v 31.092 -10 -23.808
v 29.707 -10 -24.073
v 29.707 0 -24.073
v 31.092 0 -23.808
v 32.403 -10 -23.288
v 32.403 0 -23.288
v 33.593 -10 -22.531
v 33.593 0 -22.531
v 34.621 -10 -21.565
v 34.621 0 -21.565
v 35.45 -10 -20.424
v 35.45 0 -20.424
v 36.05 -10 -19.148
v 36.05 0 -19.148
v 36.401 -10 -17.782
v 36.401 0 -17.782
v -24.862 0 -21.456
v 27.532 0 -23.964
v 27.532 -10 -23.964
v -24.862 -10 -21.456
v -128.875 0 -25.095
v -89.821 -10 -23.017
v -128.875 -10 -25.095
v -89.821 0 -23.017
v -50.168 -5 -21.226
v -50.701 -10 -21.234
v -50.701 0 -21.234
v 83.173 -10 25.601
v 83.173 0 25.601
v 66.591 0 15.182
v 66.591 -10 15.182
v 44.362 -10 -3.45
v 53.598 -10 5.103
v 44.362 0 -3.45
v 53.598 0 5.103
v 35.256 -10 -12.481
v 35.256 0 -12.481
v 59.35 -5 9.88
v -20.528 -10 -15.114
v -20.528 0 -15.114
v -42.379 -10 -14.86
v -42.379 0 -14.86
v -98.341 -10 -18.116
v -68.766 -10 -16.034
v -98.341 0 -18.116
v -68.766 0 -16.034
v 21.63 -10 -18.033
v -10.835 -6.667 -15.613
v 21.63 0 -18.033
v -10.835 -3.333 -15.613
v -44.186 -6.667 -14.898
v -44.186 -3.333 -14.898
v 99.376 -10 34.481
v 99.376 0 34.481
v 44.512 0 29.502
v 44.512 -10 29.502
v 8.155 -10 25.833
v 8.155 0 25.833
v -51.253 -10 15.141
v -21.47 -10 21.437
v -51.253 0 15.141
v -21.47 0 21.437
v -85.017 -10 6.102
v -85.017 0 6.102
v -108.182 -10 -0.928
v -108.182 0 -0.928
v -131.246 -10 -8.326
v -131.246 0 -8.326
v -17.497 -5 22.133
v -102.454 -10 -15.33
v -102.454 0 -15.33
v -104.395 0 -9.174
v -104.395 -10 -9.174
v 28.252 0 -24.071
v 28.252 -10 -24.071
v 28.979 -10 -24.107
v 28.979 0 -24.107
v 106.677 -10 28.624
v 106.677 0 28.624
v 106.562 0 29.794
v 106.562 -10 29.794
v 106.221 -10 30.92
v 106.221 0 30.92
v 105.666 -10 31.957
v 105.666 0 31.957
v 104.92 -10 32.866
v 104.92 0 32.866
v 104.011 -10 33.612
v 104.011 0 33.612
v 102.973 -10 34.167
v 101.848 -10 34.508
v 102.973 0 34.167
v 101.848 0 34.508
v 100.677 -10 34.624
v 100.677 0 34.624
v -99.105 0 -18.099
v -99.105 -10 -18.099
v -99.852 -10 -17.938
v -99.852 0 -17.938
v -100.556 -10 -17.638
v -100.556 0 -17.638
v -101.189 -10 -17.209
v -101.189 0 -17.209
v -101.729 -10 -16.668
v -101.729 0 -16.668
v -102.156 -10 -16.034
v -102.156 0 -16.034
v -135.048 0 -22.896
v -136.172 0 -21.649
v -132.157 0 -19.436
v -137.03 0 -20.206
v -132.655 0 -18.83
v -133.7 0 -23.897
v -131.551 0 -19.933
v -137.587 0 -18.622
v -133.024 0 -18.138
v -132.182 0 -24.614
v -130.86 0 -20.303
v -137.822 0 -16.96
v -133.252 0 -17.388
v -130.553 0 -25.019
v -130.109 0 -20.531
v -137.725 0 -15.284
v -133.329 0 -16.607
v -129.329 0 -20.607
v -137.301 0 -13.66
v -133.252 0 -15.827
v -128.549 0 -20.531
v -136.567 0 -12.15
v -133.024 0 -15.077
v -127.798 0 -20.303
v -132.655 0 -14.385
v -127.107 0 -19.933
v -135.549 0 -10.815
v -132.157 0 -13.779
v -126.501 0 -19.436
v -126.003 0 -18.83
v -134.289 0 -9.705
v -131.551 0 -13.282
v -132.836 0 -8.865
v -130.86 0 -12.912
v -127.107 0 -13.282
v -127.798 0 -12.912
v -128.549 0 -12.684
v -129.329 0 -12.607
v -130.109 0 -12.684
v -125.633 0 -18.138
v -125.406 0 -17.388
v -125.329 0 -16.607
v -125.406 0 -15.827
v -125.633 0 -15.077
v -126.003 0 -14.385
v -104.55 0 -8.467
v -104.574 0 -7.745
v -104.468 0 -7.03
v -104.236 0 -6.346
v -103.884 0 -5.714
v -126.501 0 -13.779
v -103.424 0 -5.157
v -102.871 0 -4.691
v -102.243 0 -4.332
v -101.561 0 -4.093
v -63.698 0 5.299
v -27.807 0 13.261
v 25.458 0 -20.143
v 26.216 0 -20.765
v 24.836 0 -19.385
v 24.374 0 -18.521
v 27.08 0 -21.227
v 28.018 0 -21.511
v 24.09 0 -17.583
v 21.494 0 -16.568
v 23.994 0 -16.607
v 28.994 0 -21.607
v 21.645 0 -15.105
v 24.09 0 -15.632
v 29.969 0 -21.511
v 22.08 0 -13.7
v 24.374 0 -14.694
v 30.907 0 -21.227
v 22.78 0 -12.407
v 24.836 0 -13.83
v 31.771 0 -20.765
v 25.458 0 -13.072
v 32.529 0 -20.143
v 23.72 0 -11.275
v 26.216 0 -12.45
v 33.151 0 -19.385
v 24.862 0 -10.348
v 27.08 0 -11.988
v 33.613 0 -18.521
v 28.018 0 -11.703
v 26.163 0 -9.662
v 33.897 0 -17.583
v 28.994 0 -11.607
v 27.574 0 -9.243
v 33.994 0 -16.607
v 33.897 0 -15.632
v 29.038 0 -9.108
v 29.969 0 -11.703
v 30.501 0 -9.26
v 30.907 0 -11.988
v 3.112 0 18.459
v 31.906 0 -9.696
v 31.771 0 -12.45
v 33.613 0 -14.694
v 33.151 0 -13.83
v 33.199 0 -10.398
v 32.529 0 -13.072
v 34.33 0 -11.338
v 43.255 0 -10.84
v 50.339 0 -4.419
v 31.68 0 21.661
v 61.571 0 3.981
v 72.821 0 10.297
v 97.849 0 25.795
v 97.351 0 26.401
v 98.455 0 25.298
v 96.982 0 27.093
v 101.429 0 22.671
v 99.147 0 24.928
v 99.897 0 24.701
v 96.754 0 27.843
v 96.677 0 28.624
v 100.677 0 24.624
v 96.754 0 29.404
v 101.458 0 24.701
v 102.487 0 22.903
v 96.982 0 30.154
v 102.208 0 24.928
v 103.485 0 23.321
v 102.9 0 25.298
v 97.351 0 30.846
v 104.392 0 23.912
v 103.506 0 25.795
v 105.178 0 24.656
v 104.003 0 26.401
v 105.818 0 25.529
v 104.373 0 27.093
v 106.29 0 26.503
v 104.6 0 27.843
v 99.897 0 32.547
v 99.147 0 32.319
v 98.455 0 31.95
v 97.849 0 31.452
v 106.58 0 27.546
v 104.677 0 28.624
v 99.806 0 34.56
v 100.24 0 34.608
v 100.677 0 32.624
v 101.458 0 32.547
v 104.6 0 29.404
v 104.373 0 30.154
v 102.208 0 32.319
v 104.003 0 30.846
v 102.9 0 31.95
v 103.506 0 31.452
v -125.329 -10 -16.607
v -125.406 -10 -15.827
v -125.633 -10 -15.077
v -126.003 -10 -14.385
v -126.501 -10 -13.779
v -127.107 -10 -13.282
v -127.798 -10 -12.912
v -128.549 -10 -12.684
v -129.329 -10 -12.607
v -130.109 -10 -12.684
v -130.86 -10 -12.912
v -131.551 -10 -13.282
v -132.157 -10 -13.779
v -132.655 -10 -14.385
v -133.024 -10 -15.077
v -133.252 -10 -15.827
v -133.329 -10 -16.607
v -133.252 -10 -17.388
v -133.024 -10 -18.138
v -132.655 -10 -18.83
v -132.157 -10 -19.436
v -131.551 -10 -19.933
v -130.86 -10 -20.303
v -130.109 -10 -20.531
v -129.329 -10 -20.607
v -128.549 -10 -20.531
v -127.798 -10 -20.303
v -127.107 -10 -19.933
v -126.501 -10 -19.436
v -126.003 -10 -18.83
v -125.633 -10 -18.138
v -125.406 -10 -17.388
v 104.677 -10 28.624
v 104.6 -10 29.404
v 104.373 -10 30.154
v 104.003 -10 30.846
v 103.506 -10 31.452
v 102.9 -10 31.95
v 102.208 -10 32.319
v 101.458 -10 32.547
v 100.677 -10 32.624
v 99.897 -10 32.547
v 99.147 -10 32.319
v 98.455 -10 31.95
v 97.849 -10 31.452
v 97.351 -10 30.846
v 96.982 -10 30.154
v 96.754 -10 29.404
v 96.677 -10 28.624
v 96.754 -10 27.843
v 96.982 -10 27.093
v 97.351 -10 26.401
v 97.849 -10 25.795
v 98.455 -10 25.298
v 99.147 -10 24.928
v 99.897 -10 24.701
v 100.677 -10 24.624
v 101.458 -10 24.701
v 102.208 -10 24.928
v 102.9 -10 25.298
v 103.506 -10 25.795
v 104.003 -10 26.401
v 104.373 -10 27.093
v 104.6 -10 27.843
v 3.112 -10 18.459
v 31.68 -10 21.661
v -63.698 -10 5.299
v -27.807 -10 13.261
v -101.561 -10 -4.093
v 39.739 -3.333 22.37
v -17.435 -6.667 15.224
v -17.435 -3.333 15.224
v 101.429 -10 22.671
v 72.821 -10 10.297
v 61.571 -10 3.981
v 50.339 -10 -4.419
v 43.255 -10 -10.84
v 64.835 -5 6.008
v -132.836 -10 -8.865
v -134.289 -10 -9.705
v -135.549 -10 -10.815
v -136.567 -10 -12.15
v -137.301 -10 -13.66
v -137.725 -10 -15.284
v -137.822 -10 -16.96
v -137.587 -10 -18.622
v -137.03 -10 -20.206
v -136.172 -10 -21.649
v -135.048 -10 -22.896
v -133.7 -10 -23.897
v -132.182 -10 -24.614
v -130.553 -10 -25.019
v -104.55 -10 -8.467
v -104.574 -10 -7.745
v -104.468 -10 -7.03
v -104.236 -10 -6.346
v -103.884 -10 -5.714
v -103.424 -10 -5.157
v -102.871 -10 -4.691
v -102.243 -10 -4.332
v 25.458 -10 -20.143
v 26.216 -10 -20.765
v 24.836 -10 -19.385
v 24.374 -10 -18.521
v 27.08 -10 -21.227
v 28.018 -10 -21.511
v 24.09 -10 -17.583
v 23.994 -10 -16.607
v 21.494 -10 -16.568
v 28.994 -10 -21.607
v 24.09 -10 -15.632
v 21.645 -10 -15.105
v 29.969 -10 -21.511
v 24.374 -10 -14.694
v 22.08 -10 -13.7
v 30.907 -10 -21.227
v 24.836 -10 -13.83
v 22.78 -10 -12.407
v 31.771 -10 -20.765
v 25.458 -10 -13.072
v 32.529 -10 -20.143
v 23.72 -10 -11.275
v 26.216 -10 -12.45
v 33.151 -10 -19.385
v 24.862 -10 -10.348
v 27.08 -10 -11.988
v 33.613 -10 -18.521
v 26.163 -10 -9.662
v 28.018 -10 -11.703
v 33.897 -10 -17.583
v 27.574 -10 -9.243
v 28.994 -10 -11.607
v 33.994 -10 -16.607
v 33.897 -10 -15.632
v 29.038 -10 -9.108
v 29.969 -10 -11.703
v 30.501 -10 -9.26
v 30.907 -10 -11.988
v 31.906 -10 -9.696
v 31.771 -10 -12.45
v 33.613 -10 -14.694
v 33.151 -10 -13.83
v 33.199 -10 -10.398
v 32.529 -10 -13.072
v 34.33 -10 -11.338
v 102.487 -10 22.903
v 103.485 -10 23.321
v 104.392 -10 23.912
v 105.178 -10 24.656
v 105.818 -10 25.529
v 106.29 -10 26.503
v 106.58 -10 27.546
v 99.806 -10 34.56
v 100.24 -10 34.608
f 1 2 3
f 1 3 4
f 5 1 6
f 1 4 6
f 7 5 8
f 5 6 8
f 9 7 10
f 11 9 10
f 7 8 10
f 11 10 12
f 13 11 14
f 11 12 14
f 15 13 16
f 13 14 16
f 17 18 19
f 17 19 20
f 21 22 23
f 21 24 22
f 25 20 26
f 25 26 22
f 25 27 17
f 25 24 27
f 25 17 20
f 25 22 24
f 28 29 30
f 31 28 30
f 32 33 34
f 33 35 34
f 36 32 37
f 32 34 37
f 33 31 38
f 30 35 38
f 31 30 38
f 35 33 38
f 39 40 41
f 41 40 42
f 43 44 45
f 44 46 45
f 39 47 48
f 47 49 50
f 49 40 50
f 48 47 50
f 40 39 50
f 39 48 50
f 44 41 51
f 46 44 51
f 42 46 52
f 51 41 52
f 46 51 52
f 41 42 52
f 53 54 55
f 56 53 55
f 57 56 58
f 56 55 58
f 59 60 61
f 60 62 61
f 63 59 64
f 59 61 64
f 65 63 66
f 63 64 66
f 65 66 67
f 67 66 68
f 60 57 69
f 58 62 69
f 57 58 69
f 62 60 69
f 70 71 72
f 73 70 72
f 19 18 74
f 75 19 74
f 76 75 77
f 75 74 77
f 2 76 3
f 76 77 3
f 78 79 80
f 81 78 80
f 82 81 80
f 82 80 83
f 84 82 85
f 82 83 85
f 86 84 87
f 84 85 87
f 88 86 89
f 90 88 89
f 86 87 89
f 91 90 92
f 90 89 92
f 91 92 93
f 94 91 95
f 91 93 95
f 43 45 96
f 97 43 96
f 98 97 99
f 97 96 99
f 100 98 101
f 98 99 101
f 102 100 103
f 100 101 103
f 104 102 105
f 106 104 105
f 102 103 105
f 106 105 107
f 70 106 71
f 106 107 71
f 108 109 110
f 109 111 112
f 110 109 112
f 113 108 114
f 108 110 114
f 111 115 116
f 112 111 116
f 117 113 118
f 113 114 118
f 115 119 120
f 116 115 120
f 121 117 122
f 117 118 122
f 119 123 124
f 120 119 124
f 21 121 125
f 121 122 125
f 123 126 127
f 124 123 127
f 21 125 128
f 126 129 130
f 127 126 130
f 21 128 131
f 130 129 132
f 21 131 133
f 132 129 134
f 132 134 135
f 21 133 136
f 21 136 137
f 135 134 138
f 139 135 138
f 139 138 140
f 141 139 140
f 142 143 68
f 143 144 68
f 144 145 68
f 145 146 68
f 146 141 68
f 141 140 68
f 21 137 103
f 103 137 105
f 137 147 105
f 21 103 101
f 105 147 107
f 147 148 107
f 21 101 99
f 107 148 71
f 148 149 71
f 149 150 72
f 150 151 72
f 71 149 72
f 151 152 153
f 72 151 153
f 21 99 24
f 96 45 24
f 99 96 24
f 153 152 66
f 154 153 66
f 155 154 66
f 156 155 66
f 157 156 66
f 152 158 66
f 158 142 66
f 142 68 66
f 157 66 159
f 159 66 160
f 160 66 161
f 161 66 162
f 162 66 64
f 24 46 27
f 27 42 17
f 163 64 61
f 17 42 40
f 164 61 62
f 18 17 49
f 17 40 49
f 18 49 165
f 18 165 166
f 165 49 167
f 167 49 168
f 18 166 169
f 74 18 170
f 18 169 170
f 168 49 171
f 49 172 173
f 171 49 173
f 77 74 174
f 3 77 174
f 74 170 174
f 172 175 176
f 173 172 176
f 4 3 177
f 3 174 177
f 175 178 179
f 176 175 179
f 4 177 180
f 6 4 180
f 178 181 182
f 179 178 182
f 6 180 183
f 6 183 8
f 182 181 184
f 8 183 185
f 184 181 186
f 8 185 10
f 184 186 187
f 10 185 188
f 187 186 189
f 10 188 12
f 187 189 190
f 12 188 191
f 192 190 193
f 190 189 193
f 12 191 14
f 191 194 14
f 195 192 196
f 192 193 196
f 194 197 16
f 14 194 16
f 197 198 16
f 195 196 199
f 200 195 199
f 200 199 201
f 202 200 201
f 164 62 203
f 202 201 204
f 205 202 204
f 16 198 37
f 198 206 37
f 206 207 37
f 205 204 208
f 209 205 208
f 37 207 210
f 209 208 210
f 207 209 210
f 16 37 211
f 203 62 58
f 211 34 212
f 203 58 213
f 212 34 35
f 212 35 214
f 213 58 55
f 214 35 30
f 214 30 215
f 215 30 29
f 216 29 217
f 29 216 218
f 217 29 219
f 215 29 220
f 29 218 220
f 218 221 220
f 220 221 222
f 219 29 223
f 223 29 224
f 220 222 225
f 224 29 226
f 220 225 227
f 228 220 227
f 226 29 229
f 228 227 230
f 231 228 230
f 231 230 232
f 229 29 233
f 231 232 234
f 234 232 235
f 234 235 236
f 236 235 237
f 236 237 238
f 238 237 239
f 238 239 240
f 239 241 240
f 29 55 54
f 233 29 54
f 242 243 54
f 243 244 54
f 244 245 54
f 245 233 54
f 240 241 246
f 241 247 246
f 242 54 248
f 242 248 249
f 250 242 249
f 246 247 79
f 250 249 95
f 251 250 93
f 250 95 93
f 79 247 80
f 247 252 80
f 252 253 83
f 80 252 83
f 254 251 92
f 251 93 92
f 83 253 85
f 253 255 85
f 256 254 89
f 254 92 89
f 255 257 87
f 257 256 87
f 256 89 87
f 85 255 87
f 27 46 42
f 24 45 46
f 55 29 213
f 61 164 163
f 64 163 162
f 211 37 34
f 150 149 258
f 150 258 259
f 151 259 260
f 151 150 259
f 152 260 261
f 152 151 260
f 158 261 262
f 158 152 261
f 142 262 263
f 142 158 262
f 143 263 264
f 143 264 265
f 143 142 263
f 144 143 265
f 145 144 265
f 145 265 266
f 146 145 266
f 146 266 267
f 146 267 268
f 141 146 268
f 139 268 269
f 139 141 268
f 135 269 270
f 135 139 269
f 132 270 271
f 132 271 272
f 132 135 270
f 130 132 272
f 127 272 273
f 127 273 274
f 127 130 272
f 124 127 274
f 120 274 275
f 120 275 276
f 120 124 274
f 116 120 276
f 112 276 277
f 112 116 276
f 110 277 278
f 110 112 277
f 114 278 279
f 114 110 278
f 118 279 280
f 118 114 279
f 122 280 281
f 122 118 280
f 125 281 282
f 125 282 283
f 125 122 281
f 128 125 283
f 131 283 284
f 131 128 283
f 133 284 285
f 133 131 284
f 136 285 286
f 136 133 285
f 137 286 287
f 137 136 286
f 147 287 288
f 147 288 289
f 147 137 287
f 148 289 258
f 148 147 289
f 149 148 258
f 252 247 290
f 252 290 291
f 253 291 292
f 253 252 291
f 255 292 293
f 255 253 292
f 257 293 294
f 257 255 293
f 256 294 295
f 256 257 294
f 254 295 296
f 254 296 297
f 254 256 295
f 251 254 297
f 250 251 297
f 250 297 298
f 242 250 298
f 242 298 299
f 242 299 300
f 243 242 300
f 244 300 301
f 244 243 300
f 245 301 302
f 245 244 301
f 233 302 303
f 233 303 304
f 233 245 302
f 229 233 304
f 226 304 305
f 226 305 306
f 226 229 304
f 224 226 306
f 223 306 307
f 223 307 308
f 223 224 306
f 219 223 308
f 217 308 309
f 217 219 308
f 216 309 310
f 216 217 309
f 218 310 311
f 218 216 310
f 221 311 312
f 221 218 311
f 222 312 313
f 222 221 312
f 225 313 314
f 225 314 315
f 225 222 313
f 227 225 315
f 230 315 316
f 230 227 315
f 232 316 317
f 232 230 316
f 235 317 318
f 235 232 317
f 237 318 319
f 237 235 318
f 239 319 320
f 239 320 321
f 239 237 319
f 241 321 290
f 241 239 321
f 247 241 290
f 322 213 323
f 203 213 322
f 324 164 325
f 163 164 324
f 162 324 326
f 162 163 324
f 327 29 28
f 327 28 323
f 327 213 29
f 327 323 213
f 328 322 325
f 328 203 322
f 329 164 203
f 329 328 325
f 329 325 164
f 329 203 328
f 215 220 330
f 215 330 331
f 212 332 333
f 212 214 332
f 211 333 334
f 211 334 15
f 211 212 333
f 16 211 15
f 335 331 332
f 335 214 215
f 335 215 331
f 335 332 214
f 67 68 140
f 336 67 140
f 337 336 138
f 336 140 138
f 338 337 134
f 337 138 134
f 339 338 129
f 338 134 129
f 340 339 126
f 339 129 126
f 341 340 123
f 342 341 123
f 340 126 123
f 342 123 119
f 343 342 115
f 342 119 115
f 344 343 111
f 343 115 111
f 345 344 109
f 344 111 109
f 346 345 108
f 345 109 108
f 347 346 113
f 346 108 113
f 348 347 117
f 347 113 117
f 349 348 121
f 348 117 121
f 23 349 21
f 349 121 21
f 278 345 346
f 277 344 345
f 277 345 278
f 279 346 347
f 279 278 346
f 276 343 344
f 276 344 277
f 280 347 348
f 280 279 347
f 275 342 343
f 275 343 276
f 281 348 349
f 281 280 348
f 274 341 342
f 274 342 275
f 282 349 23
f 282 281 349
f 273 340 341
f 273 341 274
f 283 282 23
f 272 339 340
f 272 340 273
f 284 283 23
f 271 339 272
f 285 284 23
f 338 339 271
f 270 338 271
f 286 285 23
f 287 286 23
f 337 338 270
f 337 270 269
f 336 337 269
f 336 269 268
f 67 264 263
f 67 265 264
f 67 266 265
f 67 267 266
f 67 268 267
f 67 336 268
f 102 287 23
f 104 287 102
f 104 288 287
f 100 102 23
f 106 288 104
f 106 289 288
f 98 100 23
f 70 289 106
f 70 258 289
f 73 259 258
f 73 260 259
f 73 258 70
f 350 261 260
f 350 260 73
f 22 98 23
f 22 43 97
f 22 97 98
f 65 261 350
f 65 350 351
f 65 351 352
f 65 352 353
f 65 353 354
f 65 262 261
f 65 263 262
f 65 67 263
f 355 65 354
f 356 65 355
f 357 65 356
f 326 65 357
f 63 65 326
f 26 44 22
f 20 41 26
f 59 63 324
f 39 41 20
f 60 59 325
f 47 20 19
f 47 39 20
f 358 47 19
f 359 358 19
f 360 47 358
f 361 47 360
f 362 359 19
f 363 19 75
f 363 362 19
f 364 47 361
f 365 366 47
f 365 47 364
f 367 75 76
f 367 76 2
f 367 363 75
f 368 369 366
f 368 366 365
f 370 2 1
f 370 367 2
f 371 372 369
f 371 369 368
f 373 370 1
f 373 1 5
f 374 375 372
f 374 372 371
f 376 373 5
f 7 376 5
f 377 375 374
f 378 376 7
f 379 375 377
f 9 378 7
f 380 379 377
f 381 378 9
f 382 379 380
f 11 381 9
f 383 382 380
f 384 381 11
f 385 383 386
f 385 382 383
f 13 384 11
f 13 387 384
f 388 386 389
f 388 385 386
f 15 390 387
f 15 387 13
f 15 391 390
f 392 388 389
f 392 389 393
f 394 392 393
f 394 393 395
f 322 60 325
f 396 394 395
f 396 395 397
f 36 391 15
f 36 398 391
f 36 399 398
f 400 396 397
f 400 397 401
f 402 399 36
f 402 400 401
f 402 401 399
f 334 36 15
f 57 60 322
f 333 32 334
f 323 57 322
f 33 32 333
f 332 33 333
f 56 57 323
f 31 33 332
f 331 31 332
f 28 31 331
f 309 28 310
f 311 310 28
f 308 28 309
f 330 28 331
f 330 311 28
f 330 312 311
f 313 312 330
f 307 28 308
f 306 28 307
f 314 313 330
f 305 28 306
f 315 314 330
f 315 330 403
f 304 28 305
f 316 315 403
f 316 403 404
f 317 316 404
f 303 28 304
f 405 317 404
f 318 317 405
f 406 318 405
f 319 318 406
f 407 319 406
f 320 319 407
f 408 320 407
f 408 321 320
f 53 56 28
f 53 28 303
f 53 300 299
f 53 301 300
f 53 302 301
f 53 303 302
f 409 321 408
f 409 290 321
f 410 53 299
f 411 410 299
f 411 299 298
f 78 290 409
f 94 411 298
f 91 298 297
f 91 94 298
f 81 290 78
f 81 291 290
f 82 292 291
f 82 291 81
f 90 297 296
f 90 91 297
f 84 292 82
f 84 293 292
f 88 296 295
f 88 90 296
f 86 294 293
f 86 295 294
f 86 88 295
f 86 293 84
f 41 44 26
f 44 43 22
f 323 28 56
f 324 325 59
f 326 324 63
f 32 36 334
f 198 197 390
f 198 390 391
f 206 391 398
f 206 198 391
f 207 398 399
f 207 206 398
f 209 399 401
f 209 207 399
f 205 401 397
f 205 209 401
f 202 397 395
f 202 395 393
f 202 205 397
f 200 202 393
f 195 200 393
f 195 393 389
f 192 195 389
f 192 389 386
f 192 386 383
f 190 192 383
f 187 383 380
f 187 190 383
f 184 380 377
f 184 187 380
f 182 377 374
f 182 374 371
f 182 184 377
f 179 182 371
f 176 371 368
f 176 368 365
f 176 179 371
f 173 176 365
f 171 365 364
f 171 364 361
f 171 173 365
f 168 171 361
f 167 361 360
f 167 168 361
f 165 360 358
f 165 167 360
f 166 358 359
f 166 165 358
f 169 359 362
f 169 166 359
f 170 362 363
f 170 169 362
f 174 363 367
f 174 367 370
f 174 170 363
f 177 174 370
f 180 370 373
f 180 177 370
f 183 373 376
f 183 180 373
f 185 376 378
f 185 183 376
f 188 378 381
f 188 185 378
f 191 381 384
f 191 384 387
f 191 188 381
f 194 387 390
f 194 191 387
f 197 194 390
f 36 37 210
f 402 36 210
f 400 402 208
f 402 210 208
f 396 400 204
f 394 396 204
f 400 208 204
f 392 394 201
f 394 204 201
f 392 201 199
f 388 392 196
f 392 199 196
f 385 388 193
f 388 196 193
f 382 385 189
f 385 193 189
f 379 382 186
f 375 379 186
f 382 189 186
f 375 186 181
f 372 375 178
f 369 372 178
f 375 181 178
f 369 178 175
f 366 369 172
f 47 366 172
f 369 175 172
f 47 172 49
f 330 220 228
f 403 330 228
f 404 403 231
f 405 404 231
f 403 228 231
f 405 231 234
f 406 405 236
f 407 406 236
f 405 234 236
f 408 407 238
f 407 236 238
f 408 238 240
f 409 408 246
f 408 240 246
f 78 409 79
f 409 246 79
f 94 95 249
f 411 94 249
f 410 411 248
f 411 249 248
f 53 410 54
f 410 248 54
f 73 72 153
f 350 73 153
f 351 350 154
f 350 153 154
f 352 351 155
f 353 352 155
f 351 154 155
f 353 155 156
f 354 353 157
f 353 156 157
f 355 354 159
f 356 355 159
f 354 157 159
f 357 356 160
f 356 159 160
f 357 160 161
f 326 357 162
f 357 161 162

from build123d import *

# Parameters (mm, degrees)
F0_R     = 4
F0_R_2   = 5
F1_DEPTH = 10


with BuildPart() as f1:
    # F0 (on Front) → F1 (new body)
    with BuildSketch(Plane.XZ):
        with BuildLine():
            ThreePointArc((-128.8754135109, -25.0952865806), (-123.1602737314, -22.4552566283), (-120.8289454463, -16.6073946878))
            ThreePointArc((-120.8289454463, -16.6073946878), (-124.0394968392, -9.9536939557), (-131.2458239011, -8.326357495))
            ThreePointArc((-131.2458239011, -8.326357495), (-137.7452743032, -17.797104136), (-128.8754135109, -25.0952865806))
        make_face()
        with Locations((-129.3289454463, -16.6073946878)):
            Circle(F0_R, mode=Mode.SUBTRACT)
        with BuildLine():
            ThreePointArc((-131.2458239011, -8.326357495), (-124.0394968392, -9.9536939557), (-120.8289454463, -16.6073946878))
            ThreePointArc((-120.8289454463, -16.6073946878), (-123.1602737314, -22.4552566283), (-128.8754135109, -25.0952865806))
            add(Edge.make_bspline(
                [(27.532273017, -23.963665398), (1.5839289913, -22.6401279773), (-50.8745236246, -19.0093143919), (-102.6400941915, -24.2784335073), (-128.8754135109, -25.0952865806)],
                knots=[0.0136350591, 0.0136350591, 0.0136350591, 0.0136350591, 0.501767797, 1, 1, 1, 1], degree=3))
            ThreePointArc((27.532273017, -23.963665398), (23.6774268876, -21.8978591269), (21.6302831699, -18.0330697627))
            add(Edge.make_bspline(
                [(21.6302831699, -18.0330697627), (10.6563367579, -17.139313249), (-11.4221872367, -15.3394334373), (-44.3388932106, -14.1423054761), (-78.9588463965, -16.6641001427), (-98.3406285912, -18.1155278421)],
                knots=[0, 0, 0, 0, 0.2993707154, 0.6024154943, 0.9795111889, 0.9795111889, 0.9795111889, 0.9795111889], degree=3))
            ThreePointArc((-98.3406285912, -18.1155278421), (-100.8823299041, -17.4386421951), (-102.4541582861, -15.3296672591))
            Line((-102.4541582861, -15.3296672591), (-104.3954498587, -9.1735058104))
            ThreePointArc((-104.3954498587, -9.1735058104), (-104.0739536016, -6.0220282679), (-101.5614502719, -4.0926507615))
            add(Edge.make_bspline(
                [(83.1727162004, 25.6010051817), (69.0016849645, 24.6252928547), (38.5314258984, 22.5273363348), (-18.4508975965, 16.7813390569), (-72.1336091939, 3.3504452865), (-101.5614502719, -4.0926507615)],
                knots=[0, 0, 0, 0, 0.2783902325, 0.5985889357, 0.9821534138, 0.9821534138, 0.9821534138, 0.9821534138], degree=3))
            add(Edge.make_bspline(
                [(83.1727162004, 25.6010051817), (75.1220807527, 20.7720126759), (58.4321749927, 10.7605519796), (43.1575612073, -4.5557382523), (35.2562556315, -12.4808577154)],
                knots=[0, 0, 0, 0, 0.4823562569, 1, 1, 1, 1], degree=3))
            ThreePointArc((35.2562556315, -12.4808577154), (36.1775577554, -14.4533773309), (36.4935331712, -16.6073946878))
            ThreePointArc((36.4935331712, -16.6073946878), (36.4703721297, -17.1963591935), (36.4010320542, -17.7816860907))
            add(Edge.make_bspline(
                [(101.4293835288, 22.6709745548), (88.6185616779, 17.0455138174), (63.643555199, 8.2531548454), (45.1957048246, -8.4800882278), (36.4010320542, -17.7816860907)],
                knots=[0, 0, 0, 0, 0.5101460468, 1, 1, 1, 1], degree=3))
            ThreePointArc((101.4293835288, 22.6709745548), (94.7660609505, 27.5957675413), (99.3758214052, 34.4807920361))
            add(Edge.make_bspline(
                [(99.3758214052, 34.4807920361), (60.2046354861, 30.2118651857), (-18.683100471, 27.1404553476), (-93.822170127, 3.870933866), (-131.2458239011, -8.326357495)],
                knots=[0.0054898353, 0.0054898353, 0.0054898353, 0.0054898353, 0.5011367949, 1, 1, 1, 1], degree=3))
        make_face()
        with BuildLine():
            add(Edge.make_bspline(
                [(100.6773584463, 34.6236595183), (100.2435315443, 34.5756940781), (99.8096853764, 34.5280750966), (99.3758214052, 34.4807920361)],
                knots=[0, 0, 0, 0, 0.0054898353, 0.0054898353, 0.0054898353, 0.0054898353], degree=3))
            ThreePointArc((99.3758214052, 34.4807920361), (94.7660609505, 27.5957675413), (101.4293835288, 22.6709745548))
            ThreePointArc((101.4293835288, 22.6709745548), (105.1780334232, 24.6557980348), (106.6773584463, 28.6236595183))
            ThreePointArc((106.6773584463, 28.6236595183), (104.9199991334, 32.8663002054), (100.6773584463, 34.6236595183))
        make_face()
        with Locations((100.6773584463, 28.6236595183)):
            Circle(F0_R, mode=Mode.SUBTRACT)
        with BuildLine():
            ThreePointArc((100.6773584463, 34.6236595183), (100.0226810855, 34.5878357023), (99.3758214052, 34.4807920361))
            add(Edge.make_bspline(
                [(100.6773584463, 34.6236595183), (100.2435315443, 34.5756940781), (99.8096853764, 34.5280750966), (99.3758214052, 34.4807920361)],
                knots=[0, 0, 0, 0, 0.0054898353, 0.0054898353, 0.0054898353, 0.0054898353], degree=3))
        make_face()
        with BuildLine():
            add(Edge.make_bspline(
                [(29.7066930366, -24.0734112299), (28.9818986202, -24.0372371146), (28.2570906247, -24.000635897), (27.532273017, -23.963665398)],
                knots=[0, 0, 0, 0, 0.0136350591, 0.0136350591, 0.0136350591, 0.0136350591], degree=3))
            ThreePointArc((27.532273017, -23.963665398), (28.6154795408, -24.0978603244), (29.7066930366, -24.0734112299))
        make_face()
        with BuildLine():
            ThreePointArc((21.6302831699, -18.0330697627), (23.6774268876, -21.8978591269), (27.532273017, -23.963665398))
            add(Edge.make_bspline(
                [(29.7066930366, -24.0734112299), (28.9818986202, -24.0372371146), (28.2570906247, -24.000635897), (27.532273017, -23.963665398)],
                knots=[0, 0, 0, 0, 0.0136350591, 0.0136350591, 0.0136350591, 0.0136350591], degree=3))
            ThreePointArc((29.7066930366, -24.0734112299), (34.1299449473, -22.0724906675), (36.4010320542, -17.7816860907))
            ThreePointArc((36.4010320542, -17.7816860907), (36.4703721297, -17.1963591935), (36.4935331712, -16.6073946878))
            ThreePointArc((36.4935331712, -16.6073946878), (36.1775577554, -14.4533773309), (35.2562556315, -12.4808577154))
            ThreePointArc((35.2562556315, -12.4808577154), (26.1634174718, -9.6618605019), (21.6302831699, -18.0330697627))
        make_face()
        with Locations((28.9935331712, -16.6073946878)):
            Circle(F0_R_2, mode=Mode.SUBTRACT)
    extrude(amount=F1_DEPTH)


solid = f1.part
